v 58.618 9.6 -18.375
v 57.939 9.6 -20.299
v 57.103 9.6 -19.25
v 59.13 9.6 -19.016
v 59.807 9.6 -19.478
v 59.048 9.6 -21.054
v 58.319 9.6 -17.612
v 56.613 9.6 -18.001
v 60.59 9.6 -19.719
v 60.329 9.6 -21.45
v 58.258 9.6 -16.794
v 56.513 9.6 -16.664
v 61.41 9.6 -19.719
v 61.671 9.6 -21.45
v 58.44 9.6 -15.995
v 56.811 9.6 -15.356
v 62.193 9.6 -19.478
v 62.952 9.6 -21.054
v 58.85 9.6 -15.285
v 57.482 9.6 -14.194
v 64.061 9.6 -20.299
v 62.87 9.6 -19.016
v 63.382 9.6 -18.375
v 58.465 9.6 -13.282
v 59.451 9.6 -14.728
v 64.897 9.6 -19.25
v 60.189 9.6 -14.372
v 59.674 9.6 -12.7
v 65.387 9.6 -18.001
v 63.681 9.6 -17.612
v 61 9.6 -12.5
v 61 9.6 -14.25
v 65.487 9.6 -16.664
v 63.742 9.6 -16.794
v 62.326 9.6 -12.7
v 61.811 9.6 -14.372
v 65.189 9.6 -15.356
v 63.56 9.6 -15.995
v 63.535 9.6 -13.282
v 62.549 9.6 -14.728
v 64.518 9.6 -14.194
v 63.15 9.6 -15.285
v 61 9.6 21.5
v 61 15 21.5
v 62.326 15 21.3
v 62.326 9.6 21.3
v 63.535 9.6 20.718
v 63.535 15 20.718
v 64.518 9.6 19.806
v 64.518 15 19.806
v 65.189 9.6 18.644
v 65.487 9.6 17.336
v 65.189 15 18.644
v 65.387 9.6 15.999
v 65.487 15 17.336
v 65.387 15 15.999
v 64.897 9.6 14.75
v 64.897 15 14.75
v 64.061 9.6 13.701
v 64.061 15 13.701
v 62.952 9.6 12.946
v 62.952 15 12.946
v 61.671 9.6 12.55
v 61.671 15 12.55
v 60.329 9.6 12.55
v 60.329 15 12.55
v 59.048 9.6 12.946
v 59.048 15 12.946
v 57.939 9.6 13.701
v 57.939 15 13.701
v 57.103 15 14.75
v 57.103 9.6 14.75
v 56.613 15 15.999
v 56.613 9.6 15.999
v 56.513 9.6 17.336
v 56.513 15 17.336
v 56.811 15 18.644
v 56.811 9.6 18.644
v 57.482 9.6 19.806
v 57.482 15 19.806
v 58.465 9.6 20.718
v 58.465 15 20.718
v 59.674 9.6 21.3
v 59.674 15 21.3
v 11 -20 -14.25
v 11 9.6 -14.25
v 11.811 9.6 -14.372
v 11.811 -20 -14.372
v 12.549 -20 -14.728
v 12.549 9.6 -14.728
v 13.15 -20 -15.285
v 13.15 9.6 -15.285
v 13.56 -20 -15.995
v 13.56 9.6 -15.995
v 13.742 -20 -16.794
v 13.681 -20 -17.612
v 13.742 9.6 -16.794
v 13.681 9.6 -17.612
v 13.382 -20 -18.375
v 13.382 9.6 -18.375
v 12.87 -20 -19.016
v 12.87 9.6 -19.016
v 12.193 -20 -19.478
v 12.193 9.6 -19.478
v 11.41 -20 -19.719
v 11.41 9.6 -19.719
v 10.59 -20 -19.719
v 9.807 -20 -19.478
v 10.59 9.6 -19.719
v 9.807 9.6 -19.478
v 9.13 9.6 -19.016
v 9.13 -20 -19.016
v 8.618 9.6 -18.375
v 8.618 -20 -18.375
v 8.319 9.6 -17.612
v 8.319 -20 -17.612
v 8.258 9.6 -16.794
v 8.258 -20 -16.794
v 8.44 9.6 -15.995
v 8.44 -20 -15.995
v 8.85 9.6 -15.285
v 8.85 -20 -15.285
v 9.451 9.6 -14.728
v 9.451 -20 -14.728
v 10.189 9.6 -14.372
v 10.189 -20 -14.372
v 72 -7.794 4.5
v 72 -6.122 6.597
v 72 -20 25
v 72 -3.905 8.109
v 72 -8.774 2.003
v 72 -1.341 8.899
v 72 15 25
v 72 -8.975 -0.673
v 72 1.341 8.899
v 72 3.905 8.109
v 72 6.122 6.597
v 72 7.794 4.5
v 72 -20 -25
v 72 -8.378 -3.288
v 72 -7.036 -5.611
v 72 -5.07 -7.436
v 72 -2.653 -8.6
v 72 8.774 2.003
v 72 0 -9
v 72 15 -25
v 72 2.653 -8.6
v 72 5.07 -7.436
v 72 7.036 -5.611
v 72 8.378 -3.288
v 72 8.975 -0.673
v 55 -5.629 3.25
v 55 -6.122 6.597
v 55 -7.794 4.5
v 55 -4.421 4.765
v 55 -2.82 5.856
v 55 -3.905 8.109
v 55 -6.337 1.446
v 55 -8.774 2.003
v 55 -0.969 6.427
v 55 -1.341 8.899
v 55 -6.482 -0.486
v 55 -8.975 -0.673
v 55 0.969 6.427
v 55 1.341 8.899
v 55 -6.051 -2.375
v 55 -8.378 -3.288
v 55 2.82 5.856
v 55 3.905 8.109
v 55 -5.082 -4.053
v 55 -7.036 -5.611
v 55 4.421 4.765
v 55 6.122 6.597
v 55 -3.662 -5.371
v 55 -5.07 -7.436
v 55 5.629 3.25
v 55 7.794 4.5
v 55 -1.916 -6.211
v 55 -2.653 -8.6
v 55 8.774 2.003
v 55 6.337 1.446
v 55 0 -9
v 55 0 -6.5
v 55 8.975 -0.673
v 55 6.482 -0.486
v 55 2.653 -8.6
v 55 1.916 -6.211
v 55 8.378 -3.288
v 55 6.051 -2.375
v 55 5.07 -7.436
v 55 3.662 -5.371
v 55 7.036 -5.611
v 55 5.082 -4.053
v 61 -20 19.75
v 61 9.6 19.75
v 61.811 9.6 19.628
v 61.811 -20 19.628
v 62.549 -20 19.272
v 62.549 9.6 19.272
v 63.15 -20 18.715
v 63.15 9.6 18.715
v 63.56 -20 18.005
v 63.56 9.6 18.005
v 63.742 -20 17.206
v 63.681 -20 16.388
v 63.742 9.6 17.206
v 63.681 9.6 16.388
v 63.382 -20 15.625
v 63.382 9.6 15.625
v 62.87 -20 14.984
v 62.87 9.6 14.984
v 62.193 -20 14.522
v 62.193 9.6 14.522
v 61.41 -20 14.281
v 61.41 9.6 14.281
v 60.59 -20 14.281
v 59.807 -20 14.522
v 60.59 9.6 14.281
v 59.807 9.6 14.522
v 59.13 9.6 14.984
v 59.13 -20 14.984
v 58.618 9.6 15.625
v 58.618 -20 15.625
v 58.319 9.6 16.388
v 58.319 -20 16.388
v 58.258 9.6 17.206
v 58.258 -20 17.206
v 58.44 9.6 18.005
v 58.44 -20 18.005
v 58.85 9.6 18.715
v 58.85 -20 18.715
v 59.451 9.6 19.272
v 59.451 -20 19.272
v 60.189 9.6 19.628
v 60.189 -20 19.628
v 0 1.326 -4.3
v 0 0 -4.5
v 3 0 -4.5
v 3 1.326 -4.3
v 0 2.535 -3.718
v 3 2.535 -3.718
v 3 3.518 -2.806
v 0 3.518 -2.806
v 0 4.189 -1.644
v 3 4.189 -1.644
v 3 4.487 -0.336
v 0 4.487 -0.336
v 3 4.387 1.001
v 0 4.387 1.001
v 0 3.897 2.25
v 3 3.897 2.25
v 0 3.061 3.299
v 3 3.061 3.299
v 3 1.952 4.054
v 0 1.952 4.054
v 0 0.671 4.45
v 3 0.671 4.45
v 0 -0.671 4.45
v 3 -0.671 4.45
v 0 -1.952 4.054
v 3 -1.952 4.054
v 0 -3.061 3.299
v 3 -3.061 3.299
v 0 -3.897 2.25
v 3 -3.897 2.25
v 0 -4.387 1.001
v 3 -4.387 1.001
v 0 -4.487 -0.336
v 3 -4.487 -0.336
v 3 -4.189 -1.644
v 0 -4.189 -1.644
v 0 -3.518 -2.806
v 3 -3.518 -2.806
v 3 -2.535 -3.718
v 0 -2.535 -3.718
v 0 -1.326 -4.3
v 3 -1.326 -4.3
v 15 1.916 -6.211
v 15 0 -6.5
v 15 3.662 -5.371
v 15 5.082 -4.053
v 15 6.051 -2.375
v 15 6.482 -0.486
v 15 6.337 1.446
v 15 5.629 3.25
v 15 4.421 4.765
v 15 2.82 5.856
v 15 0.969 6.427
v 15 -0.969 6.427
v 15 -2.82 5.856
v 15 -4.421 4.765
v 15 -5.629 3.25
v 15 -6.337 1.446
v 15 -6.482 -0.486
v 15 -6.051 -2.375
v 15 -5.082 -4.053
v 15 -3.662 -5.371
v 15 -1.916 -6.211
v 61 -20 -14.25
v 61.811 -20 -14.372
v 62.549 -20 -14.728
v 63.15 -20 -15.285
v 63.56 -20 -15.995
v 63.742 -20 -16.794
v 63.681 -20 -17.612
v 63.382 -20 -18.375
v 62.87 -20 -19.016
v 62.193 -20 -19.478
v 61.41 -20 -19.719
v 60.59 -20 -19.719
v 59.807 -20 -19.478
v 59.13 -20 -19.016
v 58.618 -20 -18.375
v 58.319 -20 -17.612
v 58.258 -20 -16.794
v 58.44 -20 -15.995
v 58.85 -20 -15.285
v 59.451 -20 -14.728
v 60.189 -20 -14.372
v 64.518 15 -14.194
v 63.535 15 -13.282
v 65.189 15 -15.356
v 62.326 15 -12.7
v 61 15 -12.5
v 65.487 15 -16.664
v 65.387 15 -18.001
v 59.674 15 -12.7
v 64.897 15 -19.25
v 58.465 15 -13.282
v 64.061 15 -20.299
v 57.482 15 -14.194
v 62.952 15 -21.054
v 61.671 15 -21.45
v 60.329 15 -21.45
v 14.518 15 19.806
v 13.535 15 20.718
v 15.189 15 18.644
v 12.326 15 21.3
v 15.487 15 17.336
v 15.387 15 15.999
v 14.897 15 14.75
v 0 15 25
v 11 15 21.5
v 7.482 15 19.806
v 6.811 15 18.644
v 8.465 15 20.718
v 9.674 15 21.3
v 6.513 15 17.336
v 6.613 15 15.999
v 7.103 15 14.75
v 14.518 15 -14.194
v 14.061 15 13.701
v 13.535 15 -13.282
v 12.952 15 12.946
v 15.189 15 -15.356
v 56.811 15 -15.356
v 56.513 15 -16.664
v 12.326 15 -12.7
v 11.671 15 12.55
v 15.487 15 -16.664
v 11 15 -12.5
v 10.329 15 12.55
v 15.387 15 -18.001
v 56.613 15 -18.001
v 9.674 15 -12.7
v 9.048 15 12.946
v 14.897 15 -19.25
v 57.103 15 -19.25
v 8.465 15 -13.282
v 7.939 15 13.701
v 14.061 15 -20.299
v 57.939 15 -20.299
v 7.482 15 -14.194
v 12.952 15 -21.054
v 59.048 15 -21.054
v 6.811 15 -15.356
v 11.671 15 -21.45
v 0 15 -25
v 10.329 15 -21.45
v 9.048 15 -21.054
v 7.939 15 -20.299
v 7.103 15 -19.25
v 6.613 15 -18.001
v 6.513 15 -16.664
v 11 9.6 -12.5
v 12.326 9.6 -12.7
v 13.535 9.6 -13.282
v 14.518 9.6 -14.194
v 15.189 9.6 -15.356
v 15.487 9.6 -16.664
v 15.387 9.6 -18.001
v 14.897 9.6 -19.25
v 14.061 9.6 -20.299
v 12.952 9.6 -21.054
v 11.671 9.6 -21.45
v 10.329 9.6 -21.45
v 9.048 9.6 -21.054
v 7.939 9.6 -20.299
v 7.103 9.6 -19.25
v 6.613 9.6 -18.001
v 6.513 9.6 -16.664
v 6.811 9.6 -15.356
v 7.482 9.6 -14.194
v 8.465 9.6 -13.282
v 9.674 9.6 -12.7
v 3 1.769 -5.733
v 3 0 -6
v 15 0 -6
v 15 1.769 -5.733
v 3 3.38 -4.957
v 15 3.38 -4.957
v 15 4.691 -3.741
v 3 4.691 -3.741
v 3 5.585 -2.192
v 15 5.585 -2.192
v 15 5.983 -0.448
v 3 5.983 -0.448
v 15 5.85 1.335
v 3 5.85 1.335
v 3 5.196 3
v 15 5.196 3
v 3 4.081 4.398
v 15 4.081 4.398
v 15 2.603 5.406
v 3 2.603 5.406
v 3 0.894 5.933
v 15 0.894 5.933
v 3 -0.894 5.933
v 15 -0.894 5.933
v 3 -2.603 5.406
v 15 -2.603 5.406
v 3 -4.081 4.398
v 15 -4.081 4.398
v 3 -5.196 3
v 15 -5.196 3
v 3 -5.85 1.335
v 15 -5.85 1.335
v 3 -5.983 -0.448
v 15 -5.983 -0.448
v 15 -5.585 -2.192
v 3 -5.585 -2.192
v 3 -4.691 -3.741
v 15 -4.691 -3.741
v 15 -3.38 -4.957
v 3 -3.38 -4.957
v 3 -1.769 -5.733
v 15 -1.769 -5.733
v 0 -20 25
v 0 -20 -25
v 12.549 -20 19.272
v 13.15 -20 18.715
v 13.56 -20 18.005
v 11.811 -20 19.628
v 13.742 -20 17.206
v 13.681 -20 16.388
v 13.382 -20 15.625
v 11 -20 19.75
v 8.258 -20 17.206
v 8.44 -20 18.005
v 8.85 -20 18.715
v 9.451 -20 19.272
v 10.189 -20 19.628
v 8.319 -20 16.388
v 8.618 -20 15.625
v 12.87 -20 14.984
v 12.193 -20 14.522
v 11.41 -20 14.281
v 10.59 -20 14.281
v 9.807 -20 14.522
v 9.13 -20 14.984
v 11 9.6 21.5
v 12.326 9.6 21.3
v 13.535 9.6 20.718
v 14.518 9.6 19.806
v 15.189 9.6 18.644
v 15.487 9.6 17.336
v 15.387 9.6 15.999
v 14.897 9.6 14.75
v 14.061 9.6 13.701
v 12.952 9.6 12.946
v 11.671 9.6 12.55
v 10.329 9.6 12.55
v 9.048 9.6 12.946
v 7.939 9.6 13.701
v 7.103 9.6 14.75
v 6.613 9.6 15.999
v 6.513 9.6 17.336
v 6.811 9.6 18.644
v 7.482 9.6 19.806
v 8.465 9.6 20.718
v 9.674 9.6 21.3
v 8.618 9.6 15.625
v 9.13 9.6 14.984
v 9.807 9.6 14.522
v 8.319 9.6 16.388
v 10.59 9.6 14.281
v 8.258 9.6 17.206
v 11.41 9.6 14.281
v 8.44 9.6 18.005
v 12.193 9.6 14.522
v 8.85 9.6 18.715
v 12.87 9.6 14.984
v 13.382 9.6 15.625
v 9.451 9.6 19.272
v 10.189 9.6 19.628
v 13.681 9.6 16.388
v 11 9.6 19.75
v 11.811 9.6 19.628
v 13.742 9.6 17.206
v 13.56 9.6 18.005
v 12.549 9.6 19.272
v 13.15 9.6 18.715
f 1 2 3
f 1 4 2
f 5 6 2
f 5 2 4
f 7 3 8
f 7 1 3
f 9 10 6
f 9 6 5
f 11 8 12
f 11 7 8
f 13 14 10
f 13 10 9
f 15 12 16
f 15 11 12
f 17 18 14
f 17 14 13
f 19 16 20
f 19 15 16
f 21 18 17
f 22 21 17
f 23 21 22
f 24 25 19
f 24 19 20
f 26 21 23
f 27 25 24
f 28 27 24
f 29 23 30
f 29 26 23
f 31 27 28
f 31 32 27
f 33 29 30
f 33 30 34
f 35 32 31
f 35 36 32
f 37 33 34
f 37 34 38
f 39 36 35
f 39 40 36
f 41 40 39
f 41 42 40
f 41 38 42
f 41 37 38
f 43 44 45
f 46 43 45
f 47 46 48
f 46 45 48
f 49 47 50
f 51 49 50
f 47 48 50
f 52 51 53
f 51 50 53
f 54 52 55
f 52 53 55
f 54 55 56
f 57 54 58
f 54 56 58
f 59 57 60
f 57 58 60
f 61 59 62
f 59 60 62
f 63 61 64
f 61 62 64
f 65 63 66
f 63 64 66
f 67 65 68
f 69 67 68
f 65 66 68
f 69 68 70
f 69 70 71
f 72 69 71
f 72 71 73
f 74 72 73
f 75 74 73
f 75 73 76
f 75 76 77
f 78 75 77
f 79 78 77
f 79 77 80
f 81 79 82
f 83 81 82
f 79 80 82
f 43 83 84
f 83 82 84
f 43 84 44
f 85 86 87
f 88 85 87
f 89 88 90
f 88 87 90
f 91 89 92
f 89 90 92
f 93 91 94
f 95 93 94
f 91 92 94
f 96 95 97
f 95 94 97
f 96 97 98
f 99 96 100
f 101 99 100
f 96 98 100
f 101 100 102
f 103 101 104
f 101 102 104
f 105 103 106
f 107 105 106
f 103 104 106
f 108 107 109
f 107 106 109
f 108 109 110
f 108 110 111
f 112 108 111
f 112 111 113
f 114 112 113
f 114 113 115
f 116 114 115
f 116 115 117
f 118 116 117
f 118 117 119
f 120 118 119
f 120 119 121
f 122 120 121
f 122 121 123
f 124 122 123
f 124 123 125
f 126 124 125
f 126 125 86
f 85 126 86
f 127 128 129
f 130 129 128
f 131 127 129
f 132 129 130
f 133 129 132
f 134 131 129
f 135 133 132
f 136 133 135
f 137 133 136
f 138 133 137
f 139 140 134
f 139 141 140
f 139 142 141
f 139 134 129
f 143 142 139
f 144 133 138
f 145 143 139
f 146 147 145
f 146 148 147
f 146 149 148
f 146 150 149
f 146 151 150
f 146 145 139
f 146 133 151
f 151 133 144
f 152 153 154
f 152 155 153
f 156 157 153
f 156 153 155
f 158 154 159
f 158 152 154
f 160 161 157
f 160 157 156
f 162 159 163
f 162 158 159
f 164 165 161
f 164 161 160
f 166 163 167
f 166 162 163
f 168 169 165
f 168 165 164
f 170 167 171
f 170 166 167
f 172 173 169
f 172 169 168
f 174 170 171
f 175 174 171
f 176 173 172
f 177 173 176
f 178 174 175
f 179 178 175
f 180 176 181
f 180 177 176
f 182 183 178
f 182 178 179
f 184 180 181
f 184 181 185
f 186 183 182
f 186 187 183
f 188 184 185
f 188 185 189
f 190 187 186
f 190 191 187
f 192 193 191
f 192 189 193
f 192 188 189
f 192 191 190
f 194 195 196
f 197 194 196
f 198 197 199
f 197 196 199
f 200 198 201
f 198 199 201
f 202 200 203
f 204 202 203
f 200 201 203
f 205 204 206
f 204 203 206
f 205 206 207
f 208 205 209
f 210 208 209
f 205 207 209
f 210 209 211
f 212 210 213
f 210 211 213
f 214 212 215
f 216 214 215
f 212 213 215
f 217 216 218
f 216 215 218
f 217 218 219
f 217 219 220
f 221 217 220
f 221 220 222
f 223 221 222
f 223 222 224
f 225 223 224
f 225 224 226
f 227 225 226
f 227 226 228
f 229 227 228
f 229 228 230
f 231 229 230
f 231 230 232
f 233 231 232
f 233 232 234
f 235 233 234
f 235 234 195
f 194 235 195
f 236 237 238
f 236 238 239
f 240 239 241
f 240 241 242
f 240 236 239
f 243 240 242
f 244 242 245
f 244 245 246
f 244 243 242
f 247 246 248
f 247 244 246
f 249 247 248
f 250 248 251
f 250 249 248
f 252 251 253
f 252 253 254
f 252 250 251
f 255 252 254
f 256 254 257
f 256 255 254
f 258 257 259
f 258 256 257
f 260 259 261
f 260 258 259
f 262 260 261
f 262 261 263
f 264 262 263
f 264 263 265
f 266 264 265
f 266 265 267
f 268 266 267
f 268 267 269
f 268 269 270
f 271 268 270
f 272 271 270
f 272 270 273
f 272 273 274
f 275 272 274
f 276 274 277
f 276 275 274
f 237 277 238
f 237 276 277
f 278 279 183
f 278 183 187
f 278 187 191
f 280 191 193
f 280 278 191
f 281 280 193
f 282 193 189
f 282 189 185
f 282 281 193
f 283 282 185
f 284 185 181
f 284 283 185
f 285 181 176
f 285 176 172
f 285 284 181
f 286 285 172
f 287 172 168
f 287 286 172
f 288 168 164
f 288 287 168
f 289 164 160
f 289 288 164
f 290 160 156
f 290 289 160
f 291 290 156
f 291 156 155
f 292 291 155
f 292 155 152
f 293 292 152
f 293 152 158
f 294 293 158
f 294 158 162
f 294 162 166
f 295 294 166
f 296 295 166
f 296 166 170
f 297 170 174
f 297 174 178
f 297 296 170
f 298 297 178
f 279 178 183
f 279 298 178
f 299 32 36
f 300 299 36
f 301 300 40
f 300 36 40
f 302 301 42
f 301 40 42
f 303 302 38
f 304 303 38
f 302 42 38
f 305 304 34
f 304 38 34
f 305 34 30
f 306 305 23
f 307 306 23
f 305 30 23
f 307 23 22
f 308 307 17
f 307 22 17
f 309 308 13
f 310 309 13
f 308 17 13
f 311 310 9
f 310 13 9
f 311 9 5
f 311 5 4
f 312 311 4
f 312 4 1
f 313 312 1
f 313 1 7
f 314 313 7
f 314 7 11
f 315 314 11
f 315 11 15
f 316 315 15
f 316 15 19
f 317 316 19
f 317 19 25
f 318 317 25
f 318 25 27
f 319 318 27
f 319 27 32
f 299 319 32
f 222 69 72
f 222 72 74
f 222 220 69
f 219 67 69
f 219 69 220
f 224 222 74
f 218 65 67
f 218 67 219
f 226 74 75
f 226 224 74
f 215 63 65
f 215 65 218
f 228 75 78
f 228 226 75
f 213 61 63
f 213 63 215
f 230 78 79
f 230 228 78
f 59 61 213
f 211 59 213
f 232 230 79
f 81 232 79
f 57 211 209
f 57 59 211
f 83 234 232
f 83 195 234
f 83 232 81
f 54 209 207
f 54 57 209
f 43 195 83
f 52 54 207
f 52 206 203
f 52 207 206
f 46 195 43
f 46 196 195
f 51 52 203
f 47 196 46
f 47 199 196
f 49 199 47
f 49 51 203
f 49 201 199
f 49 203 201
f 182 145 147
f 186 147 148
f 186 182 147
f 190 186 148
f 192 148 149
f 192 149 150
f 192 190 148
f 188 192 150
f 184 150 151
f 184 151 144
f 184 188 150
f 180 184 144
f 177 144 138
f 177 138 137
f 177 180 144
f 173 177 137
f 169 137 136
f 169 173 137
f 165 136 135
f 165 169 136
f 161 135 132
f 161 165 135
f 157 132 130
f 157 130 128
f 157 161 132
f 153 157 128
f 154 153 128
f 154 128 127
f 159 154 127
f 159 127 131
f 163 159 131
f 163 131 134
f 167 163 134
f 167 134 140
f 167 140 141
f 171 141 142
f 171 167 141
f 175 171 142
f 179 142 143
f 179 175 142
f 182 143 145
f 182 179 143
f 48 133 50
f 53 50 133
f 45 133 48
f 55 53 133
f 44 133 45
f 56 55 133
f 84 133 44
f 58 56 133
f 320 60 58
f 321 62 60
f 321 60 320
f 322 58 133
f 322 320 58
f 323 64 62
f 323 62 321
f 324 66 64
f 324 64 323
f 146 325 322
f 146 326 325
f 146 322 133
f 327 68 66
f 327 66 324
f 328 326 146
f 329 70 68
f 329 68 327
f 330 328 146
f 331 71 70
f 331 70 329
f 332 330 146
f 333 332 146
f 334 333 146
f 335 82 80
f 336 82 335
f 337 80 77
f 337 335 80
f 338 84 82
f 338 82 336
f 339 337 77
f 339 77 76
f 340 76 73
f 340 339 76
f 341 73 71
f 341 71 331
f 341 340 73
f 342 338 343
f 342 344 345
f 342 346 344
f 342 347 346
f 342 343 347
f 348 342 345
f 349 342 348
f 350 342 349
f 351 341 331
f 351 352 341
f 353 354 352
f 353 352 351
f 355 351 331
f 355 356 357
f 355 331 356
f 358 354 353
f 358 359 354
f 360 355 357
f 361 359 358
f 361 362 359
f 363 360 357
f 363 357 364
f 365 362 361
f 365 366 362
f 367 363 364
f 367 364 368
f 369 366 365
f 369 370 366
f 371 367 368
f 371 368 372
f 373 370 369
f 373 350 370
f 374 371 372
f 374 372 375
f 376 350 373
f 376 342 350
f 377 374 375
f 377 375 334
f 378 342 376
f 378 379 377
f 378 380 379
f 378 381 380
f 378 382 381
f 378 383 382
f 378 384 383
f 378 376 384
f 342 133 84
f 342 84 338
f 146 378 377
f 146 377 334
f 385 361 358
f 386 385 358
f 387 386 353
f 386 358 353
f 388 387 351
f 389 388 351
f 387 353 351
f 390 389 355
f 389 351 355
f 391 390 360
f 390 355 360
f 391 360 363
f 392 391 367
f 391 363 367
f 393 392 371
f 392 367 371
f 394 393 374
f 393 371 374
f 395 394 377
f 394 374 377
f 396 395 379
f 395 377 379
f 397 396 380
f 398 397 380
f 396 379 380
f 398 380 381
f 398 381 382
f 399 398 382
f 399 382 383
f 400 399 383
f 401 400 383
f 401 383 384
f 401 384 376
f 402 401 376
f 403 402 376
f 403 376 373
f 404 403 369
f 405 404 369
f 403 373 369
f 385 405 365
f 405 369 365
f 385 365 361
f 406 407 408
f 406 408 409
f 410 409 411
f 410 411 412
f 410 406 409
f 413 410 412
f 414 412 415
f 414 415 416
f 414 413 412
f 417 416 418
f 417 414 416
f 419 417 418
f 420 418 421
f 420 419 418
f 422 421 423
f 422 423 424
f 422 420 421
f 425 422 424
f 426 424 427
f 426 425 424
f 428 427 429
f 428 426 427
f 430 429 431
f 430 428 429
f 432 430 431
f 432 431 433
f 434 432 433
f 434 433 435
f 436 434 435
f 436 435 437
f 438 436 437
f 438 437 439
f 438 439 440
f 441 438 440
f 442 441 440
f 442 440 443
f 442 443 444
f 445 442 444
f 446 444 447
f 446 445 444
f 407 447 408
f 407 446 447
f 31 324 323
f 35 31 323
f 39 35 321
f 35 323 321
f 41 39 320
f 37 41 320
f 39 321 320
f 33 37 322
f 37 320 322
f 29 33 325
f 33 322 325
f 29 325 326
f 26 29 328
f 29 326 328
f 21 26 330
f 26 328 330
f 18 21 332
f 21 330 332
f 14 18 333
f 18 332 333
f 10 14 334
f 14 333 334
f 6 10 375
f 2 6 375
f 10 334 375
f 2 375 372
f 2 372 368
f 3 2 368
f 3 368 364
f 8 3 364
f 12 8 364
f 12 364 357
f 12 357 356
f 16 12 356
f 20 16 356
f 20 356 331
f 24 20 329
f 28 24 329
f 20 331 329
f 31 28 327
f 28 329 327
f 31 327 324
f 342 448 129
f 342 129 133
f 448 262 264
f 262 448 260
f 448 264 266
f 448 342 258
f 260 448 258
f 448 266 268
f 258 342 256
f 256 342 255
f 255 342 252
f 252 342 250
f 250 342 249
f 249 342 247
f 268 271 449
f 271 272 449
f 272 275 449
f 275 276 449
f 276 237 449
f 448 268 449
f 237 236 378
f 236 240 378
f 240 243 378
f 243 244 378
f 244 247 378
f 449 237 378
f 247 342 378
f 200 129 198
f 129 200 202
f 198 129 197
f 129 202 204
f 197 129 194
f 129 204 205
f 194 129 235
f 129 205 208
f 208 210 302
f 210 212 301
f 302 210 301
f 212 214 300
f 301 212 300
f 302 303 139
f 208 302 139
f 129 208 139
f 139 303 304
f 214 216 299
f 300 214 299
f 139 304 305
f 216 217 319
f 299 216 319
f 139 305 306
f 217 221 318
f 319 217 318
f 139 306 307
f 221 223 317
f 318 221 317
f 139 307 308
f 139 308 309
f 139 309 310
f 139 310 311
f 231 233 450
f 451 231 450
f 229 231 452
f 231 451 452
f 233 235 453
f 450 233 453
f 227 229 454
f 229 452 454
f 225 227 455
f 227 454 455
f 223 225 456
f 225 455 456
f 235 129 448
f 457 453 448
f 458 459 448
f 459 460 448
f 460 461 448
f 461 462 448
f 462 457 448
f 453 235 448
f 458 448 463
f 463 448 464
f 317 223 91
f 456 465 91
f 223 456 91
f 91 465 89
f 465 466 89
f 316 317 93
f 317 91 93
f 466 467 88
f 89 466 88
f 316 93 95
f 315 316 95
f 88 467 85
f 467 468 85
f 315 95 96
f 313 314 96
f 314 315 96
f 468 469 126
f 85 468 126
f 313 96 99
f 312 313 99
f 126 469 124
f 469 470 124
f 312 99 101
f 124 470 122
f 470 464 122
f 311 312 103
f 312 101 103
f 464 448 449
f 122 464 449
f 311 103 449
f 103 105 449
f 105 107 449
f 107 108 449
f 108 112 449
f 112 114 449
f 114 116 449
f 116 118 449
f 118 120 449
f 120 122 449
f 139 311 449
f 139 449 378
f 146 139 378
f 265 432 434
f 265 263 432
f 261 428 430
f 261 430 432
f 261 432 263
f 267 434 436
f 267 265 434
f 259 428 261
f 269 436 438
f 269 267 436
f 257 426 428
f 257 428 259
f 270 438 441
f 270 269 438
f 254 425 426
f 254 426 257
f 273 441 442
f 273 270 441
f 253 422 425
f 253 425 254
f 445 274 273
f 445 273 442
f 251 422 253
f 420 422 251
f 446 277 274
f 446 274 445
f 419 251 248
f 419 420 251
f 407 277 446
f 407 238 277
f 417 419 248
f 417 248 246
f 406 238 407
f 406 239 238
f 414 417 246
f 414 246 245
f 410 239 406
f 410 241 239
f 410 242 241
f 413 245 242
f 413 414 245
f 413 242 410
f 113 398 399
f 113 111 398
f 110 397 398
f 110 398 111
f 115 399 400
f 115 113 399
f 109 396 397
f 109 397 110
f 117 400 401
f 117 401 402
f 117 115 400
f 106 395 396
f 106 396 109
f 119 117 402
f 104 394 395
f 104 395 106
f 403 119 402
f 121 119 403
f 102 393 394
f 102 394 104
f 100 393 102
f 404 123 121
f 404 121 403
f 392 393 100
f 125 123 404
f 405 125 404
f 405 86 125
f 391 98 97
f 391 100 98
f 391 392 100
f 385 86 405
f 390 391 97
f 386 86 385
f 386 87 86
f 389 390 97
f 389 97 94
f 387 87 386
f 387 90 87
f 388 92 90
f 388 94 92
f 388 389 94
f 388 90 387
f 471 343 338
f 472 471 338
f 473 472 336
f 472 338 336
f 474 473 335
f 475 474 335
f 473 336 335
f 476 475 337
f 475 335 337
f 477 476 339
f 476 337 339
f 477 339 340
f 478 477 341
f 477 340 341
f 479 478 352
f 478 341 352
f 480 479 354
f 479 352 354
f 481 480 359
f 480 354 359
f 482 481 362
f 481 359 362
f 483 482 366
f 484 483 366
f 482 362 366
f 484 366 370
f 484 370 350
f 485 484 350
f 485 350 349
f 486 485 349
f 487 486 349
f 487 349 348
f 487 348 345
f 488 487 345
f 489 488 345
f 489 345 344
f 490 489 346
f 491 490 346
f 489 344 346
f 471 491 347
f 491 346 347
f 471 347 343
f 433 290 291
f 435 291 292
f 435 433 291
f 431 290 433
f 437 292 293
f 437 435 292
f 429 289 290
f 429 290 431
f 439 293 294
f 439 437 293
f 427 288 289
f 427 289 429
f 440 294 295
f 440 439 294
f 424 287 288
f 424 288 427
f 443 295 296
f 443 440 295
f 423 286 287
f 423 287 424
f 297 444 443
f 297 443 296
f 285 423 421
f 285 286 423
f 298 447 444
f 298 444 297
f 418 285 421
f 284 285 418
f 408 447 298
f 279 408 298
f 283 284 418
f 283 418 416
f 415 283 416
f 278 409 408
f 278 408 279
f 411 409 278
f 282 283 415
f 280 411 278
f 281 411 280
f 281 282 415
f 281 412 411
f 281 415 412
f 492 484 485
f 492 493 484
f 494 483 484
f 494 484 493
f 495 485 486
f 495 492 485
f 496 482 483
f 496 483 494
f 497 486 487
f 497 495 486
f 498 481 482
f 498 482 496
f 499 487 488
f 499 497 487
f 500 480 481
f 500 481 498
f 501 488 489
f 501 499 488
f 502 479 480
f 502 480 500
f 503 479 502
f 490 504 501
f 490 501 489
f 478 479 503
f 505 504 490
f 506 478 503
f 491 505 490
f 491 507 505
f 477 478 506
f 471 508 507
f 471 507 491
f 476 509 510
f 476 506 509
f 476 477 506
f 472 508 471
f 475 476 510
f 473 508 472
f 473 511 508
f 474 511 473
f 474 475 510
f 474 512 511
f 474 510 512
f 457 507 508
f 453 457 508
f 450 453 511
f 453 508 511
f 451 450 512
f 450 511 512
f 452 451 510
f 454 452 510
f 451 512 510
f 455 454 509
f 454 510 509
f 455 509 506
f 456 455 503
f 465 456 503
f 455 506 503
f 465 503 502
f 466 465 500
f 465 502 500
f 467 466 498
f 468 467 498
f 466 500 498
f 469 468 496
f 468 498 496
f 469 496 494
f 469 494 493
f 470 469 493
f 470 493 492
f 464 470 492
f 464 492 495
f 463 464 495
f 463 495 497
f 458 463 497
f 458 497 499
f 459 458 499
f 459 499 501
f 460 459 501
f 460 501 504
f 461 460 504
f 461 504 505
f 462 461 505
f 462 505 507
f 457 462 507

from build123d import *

# Parameters (mm, degrees)
SKETCH_HOUSING_PROFILE_W             = 50
SKETCH_HOUSING_PROFILE_H             = 35
HOUSING_BLOCK_72X50X35_DEPTH         = 72
SKETCH_WEB_CLEARANCE_HOLE_9_R        = 4.5
WEB_CLEARANCE_HOLE_9_DEPTH           = 3
SKETCH_REAR_BUSHING_BORE_12_R        = 6
REAR_BUSHING_BORE_12_H7_DEPTH        = 12
SKETCH_SPRING_BORE_13_R              = 6.5
SPRING_POCKET_BORE_13_DEPTH          = 40
SKETCH_FRONT_BUSHING_BORE_18_R       = 9
FRONT_BUSHING_BORE_18_H7_DEPTH       = 17
SKETCH_MOUNTING_CLEARANCE_HOLES_M5_R = 2.75
MOUNTING_CLEARANCE_HOLES_M5_DEPTH    = 35
SKETCH_MOUNTING_COUNTERBORES_9_R     = 4.5
MOUNTING_COUNTERBORES_9X5P4_DEPTH    = 5.4


with BuildPart() as part:
    # Sketch_Housing_Profile → Housing_Block_72x50x35 (new body)
    with BuildSketch(Plane(origin=(0, 0, 0), x_dir=(0, 0, -1), z_dir=(1, 0, 0))):
        with Locations((0, -2.5)):
            Rectangle(SKETCH_HOUSING_PROFILE_W, SKETCH_HOUSING_PROFILE_H)
    extrude(amount=HOUSING_BLOCK_72X50X35_DEPTH)

    # Sketch_Web_Clearance_Hole_9 → Web_Clearance_Hole_9 (cut)
    with BuildSketch(Plane(origin=(0, 0, 0), x_dir=(0, 0, -1), z_dir=(1, 0, 0))):
        Circle(SKETCH_WEB_CLEARANCE_HOLE_9_R)
    extrude(amount=WEB_CLEARANCE_HOLE_9_DEPTH, mode=Mode.SUBTRACT)

    # Sketch_Rear_Bushing_Bore_12 → Rear_Bushing_Bore_12_H7 (cut)
    with BuildSketch(Plane(origin=(3, 0, 0), x_dir=(0, 0, -1), z_dir=(1, 0, 0))):
        Circle(SKETCH_REAR_BUSHING_BORE_12_R)
    extrude(amount=REAR_BUSHING_BORE_12_H7_DEPTH, mode=Mode.SUBTRACT)

    # Sketch_Spring_Bore_13 → Spring_Pocket_Bore_13 (cut)
    with BuildSketch(Plane(origin=(15, 0, 0), x_dir=(0, 0, -1), z_dir=(1, 0, 0))):
        Circle(SKETCH_SPRING_BORE_13_R)
    extrude(amount=SPRING_POCKET_BORE_13_DEPTH, mode=Mode.SUBTRACT)

    # Sketch_Front_Bushing_Bore_18 → Front_Bushing_Bore_18_H7 (cut)
    with BuildSketch(Plane(origin=(55, 0, 0), x_dir=(0, 0, -1), z_dir=(1, 0, 0))):
        Circle(SKETCH_FRONT_BUSHING_BORE_18_R)
    extrude(amount=FRONT_BUSHING_BORE_18_H7_DEPTH, mode=Mode.SUBTRACT)

    # Sketch_Mounting_Clearance_Holes_M5 → Mounting_Clearance_Holes_M5 (cut)
    with BuildSketch(Plane(origin=(0, 15, 0), x_dir=(1, 0, 0), z_dir=(0, 1, 0))):
        with Locations((11, 17)):
            Circle(SKETCH_MOUNTING_CLEARANCE_HOLES_M5_R)
        with Locations((61, 17)):
            Circle(SKETCH_MOUNTING_CLEARANCE_HOLES_M5_R)
        with Locations((11, -17)):
            Circle(SKETCH_MOUNTING_CLEARANCE_HOLES_M5_R)
        with Locations((61, -17)):
            Circle(SKETCH_MOUNTING_CLEARANCE_HOLES_M5_R)
    extrude(amount=-MOUNTING_CLEARANCE_HOLES_M5_DEPTH, mode=Mode.SUBTRACT)

    # Sketch_Mounting_Counterbores_9 → Mounting_Counterbores_9x5p4 (cut)
    with BuildSketch(Plane(origin=(0, 15, 0), x_dir=(1, 0, 0), z_dir=(0, 1, 0))):
        with Locations((11, 17)):
            Circle(SKETCH_MOUNTING_COUNTERBORES_9_R)
        with Locations((61, 17)):
            Circle(SKETCH_MOUNTING_COUNTERBORES_9_R)
        with Locations((11, -17)):
            Circle(SKETCH_MOUNTING_COUNTERBORES_9_R)
        with Locations((61, -17)):
            Circle(SKETCH_MOUNTING_COUNTERBORES_9_R)
    extrude(amount=-MOUNTING_COUNTERBORES_9X5P4_DEPTH, mode=Mode.SUBTRACT)


solid = part.part
